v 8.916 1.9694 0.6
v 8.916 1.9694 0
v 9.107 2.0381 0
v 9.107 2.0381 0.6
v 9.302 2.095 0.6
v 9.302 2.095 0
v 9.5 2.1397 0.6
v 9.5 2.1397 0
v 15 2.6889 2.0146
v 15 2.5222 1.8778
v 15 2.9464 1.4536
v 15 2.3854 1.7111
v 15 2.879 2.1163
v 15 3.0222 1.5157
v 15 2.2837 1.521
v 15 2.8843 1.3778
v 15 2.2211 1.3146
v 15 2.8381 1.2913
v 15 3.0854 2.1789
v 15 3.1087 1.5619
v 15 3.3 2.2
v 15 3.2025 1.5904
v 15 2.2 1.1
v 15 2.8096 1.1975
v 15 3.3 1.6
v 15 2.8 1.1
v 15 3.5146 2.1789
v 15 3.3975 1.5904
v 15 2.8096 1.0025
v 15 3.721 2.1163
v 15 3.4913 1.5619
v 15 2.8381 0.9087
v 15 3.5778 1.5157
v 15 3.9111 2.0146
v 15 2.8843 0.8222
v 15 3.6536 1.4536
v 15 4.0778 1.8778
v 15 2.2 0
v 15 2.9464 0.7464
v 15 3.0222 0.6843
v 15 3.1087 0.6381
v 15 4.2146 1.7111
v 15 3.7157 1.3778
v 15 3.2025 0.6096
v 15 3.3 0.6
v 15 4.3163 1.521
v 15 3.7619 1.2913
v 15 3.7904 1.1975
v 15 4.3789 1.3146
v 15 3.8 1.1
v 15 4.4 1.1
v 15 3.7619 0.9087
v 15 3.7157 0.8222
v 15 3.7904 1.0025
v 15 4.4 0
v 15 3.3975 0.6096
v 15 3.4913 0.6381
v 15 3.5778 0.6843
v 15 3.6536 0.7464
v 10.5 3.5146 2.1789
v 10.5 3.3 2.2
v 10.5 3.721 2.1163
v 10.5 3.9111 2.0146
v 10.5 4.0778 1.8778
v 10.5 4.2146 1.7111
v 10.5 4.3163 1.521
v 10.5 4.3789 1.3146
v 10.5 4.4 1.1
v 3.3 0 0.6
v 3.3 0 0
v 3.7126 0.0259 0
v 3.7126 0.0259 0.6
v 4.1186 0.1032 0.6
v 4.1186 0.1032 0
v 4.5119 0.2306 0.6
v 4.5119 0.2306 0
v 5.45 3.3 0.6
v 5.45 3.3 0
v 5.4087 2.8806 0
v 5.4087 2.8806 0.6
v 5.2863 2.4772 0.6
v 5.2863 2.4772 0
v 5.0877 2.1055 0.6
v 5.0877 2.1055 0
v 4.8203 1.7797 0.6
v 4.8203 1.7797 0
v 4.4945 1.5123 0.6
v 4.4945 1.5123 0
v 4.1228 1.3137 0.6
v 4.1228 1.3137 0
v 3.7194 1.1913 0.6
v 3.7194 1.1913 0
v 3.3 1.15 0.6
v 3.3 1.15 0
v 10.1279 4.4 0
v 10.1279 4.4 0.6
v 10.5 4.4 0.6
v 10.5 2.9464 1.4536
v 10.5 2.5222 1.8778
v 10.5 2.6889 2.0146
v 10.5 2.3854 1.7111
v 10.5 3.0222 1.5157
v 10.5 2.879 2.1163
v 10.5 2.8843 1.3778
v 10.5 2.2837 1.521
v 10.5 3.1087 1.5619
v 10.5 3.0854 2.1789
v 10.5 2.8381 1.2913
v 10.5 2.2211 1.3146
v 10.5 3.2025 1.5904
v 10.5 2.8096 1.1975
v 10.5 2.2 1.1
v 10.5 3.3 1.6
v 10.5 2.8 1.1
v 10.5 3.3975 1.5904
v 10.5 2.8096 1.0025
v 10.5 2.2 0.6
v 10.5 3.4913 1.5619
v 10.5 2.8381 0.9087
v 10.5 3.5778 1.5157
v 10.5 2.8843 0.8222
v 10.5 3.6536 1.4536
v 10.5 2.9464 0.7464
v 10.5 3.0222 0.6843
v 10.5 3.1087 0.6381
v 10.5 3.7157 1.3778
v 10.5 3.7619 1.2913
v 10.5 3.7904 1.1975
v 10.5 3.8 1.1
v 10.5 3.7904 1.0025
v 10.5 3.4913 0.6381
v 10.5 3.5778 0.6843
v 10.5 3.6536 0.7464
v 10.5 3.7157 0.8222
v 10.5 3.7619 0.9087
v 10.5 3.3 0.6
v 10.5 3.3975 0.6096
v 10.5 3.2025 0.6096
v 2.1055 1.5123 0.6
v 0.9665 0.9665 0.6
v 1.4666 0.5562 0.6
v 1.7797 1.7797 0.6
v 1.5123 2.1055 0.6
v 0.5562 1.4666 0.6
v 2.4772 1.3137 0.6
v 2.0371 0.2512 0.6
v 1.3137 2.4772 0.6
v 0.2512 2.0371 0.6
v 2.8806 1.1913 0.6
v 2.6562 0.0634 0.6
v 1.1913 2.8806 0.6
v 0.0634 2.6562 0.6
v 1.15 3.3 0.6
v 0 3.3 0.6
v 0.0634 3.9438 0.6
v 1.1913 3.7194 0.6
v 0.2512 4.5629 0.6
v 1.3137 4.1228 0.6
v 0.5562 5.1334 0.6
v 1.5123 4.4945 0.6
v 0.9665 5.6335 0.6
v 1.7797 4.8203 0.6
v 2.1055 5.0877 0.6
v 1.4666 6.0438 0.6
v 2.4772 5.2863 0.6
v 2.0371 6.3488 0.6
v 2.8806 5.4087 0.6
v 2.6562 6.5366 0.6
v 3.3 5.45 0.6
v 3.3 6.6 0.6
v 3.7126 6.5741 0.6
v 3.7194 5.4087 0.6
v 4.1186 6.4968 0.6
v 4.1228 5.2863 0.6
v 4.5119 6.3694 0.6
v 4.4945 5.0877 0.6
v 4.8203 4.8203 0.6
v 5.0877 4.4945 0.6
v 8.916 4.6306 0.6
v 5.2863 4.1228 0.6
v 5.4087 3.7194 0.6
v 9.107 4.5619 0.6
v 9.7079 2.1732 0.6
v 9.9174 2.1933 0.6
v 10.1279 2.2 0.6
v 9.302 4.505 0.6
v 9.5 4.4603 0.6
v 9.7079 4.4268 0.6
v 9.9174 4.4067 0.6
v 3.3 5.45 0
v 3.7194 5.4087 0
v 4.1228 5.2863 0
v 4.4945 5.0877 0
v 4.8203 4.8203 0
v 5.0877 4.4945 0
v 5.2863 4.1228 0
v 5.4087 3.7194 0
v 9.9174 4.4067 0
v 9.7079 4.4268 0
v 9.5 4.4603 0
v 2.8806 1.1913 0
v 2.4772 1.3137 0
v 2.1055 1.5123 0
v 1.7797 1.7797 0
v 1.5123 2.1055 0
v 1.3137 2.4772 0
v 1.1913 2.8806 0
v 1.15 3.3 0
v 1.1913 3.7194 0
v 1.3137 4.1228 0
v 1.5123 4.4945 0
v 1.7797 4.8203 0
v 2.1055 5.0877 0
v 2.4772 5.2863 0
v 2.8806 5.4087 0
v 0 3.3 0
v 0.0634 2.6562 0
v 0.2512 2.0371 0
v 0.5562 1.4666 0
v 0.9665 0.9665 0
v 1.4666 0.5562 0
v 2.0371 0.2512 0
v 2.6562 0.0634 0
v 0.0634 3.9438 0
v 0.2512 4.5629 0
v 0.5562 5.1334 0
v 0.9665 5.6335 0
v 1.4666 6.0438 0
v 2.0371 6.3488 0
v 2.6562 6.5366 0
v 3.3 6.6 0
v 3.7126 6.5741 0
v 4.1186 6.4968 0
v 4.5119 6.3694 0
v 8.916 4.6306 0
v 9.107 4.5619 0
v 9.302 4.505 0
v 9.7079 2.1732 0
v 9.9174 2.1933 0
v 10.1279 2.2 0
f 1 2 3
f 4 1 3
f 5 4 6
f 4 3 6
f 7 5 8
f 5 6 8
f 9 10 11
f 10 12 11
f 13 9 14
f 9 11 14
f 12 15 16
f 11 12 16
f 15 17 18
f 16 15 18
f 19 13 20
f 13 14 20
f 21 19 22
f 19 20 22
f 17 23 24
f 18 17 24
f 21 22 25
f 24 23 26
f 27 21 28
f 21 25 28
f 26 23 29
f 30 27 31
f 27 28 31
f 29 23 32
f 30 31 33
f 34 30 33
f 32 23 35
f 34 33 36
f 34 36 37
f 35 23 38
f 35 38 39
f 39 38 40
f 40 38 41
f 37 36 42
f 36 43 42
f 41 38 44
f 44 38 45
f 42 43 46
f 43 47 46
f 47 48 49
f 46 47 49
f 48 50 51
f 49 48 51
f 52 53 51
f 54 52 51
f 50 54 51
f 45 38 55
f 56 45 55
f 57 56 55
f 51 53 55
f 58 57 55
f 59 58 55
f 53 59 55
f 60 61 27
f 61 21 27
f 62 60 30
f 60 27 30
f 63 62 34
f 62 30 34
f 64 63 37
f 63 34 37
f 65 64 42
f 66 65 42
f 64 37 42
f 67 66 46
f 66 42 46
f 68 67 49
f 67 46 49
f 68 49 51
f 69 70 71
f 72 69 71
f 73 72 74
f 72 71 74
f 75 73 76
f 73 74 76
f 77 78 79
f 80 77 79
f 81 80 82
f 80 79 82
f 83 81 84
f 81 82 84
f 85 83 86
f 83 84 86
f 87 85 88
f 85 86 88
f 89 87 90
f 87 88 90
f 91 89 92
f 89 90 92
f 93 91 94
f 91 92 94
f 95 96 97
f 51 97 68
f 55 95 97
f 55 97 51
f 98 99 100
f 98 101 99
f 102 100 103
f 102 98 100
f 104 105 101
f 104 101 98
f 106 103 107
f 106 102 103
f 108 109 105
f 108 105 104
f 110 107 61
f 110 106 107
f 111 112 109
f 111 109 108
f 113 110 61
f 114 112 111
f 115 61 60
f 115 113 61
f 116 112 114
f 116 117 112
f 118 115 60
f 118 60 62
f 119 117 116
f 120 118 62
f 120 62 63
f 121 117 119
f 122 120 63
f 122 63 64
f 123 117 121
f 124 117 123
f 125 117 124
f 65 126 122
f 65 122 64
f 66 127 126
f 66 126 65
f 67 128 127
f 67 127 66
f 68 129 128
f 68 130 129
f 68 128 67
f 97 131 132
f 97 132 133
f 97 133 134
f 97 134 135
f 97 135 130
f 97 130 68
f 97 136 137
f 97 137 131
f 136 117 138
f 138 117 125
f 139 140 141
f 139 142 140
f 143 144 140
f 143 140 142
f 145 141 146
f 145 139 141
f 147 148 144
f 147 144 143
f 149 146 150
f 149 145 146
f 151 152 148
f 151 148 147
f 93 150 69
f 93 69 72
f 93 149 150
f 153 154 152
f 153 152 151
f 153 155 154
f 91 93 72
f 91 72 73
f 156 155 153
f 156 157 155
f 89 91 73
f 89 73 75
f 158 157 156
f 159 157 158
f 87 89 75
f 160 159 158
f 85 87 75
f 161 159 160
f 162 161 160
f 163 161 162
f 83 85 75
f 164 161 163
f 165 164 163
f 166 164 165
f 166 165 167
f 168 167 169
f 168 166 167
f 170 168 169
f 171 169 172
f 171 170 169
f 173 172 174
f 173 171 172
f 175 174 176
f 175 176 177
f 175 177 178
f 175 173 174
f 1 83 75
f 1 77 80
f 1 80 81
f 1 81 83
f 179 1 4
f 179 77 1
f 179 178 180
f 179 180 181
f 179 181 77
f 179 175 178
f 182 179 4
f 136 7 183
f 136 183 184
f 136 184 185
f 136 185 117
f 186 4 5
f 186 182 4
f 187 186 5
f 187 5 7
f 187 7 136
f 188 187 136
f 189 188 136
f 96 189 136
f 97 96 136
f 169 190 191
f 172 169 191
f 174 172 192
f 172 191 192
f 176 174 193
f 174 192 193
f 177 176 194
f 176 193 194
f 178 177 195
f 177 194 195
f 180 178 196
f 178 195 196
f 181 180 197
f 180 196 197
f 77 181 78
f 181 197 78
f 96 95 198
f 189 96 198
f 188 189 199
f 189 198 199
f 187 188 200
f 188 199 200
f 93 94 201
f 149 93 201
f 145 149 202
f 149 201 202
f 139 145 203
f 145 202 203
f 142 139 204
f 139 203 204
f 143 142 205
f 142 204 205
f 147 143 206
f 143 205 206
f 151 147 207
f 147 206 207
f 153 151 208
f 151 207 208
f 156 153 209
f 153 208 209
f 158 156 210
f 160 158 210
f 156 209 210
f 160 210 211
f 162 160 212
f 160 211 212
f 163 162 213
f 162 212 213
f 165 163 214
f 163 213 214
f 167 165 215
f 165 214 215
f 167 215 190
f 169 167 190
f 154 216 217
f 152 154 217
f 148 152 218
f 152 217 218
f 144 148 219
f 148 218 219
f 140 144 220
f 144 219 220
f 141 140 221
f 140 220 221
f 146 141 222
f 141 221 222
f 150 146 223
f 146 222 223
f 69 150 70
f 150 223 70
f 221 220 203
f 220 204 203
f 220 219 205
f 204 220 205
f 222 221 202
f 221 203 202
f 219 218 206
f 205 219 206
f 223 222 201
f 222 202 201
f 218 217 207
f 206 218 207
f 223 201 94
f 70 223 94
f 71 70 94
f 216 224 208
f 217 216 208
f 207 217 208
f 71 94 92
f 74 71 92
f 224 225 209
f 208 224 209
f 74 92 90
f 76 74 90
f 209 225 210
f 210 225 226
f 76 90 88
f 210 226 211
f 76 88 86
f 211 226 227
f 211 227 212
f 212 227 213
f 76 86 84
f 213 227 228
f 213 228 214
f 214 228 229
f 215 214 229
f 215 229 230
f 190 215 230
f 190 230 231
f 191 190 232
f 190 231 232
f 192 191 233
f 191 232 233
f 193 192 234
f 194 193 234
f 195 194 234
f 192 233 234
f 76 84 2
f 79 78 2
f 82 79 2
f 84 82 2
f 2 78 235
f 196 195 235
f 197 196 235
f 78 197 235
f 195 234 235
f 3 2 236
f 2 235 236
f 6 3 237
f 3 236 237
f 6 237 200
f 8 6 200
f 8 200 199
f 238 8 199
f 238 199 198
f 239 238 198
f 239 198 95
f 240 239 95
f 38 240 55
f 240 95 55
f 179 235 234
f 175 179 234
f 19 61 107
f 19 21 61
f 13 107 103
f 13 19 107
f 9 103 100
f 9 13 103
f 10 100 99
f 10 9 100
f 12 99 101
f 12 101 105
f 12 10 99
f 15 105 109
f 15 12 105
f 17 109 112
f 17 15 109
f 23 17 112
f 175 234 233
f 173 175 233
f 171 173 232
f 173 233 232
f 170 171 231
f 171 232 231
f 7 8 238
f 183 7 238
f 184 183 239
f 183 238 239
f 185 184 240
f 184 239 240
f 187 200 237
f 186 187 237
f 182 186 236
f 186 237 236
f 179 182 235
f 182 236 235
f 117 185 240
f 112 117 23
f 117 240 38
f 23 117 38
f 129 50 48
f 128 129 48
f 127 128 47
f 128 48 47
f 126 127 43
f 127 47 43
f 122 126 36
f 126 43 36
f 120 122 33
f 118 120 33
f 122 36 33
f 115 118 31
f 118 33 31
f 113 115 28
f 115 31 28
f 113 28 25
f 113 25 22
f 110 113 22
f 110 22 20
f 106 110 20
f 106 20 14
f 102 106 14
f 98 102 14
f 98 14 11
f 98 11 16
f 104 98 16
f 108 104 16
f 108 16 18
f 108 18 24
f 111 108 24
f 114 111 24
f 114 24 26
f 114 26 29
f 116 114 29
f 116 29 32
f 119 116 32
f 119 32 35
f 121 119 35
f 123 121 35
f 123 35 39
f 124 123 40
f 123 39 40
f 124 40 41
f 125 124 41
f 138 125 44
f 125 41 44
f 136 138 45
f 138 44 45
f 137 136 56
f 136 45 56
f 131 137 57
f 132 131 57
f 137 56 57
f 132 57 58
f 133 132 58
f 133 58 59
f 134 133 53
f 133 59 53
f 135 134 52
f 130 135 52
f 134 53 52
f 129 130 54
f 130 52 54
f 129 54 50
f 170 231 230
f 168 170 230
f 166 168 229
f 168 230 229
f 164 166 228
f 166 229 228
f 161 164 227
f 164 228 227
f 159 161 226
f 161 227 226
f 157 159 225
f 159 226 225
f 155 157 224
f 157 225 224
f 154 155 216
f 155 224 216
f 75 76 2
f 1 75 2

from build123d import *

# Parameters (mm, degrees)
F0_W     = 4.5
F0_H     = 2.2
F1_DEPTH = 0.6
F2_W     = 4.5
F2_H     = 2.2
F3_DEPTH = 1.6
F4_R     = 1.09999
F5_R     = 0.5
F6_DEPTH = 25


# Not quite as in the source:
# - a fillet or chamfer is up to 0.001 mm smaller than in the source, because OpenCascade refuses the exact size


with BuildPart() as f1:
    # F0 (on Top) → F1 (new body)
    with BuildSketch(Plane.XY):
        with BuildLine():
            ThreePointArc((8.9159970588, 1.9694225865), (9.2040660975, 2.0680561106), (9.5, 2.1397182935))
            Line((9.5, 2.1397182935), (9.5, 4.4602817065))
            ThreePointArc((9.5, 4.4602817065), (9.2040660975, 4.5319438894), (8.9159970588, 4.6305774135))
            Line((8.9159970588, 4.6305774135), (4.5118766379, 6.3694225865))
            ThreePointArc((4.5118766379, 6.3694225865), (3.9168085053, 6.5418431899), (3.3, 6.6))
            Line((3.3, 6.6), (3.3, 5.45))
            ThreePointArc((3.3, 5.45), (4.8202795796, 4.8202795796), (5.45, 3.3))
            ThreePointArc((5.45, 3.3), (4.8202795796, 1.7797204204), (3.3, 1.15))
            Line((3.3, 1.15), (3.3, 0))
            ThreePointArc((3.3, 0), (3.9168085053, 0.0581568101), (4.5118766379, 0.2305774135))
            Line((4.5118766379, 0.2305774135), (8.9159970588, 1.9694225865))
        make_face()
        with Locations((12.75, 3.3)):
            Rectangle(F0_W, F0_H)
        with BuildLine():
            Line((10.1278736967, 2.2), (10.5, 2.2))
            Line((10.5, 2.2), (10.5, 4.4))
            Line((10.5, 4.4), (10.1278736967, 4.4))
            ThreePointArc((10.1278736967, 4.4), (9.8124932664, 4.4151049965), (9.5, 4.4602817065))
            Line((9.5, 4.4602817065), (9.5, 2.1397182935))
            ThreePointArc((9.5, 2.1397182935), (9.8124932664, 2.1848950035), (10.1278736967, 2.2))
        make_face()
        with BuildLine():
            ThreePointArc((0, 3.3), (0.9665476221, 0.9665476221), (3.3, 0))
            Line((3.3, 0), (3.3, 1.15))
            ThreePointArc((3.3, 1.15), (1.15, 3.3), (3.3, 5.45))
            Line((3.3, 5.45), (3.3, 6.6))
            ThreePointArc((3.3, 6.6), (0.9665476221, 5.6334523779), (0, 3.3))
        make_face()
    extrude(amount=F1_DEPTH)

    # F2 (on face) → F3 (join)
    with BuildSketch(Plane.XY.offset(0.6)):
        with Locations((12.75, 3.3)):
            Rectangle(F2_W, F2_H)
    extrude(amount=F3_DEPTH)

    # F4 (radius 1.1 in the source; OpenCascade refuses exactly that, so slightly less here)
    f4_edges = [f1.edges().sort_by_distance(p)[0] for p in [
        (12.75, 4.4, 2.2),
        (12.75, 2.2, 2.2),
    ]]
    fillet(f4_edges, radius=F4_R)

    # F5 (on face) → F6 (cut)
    with BuildSketch(Plane.YZ.offset(15)):
        with Locations((3.3, 1.1)):
            Circle(F5_R)
    extrude(amount=-F6_DEPTH, mode=Mode.SUBTRACT)


solid = f1.part
